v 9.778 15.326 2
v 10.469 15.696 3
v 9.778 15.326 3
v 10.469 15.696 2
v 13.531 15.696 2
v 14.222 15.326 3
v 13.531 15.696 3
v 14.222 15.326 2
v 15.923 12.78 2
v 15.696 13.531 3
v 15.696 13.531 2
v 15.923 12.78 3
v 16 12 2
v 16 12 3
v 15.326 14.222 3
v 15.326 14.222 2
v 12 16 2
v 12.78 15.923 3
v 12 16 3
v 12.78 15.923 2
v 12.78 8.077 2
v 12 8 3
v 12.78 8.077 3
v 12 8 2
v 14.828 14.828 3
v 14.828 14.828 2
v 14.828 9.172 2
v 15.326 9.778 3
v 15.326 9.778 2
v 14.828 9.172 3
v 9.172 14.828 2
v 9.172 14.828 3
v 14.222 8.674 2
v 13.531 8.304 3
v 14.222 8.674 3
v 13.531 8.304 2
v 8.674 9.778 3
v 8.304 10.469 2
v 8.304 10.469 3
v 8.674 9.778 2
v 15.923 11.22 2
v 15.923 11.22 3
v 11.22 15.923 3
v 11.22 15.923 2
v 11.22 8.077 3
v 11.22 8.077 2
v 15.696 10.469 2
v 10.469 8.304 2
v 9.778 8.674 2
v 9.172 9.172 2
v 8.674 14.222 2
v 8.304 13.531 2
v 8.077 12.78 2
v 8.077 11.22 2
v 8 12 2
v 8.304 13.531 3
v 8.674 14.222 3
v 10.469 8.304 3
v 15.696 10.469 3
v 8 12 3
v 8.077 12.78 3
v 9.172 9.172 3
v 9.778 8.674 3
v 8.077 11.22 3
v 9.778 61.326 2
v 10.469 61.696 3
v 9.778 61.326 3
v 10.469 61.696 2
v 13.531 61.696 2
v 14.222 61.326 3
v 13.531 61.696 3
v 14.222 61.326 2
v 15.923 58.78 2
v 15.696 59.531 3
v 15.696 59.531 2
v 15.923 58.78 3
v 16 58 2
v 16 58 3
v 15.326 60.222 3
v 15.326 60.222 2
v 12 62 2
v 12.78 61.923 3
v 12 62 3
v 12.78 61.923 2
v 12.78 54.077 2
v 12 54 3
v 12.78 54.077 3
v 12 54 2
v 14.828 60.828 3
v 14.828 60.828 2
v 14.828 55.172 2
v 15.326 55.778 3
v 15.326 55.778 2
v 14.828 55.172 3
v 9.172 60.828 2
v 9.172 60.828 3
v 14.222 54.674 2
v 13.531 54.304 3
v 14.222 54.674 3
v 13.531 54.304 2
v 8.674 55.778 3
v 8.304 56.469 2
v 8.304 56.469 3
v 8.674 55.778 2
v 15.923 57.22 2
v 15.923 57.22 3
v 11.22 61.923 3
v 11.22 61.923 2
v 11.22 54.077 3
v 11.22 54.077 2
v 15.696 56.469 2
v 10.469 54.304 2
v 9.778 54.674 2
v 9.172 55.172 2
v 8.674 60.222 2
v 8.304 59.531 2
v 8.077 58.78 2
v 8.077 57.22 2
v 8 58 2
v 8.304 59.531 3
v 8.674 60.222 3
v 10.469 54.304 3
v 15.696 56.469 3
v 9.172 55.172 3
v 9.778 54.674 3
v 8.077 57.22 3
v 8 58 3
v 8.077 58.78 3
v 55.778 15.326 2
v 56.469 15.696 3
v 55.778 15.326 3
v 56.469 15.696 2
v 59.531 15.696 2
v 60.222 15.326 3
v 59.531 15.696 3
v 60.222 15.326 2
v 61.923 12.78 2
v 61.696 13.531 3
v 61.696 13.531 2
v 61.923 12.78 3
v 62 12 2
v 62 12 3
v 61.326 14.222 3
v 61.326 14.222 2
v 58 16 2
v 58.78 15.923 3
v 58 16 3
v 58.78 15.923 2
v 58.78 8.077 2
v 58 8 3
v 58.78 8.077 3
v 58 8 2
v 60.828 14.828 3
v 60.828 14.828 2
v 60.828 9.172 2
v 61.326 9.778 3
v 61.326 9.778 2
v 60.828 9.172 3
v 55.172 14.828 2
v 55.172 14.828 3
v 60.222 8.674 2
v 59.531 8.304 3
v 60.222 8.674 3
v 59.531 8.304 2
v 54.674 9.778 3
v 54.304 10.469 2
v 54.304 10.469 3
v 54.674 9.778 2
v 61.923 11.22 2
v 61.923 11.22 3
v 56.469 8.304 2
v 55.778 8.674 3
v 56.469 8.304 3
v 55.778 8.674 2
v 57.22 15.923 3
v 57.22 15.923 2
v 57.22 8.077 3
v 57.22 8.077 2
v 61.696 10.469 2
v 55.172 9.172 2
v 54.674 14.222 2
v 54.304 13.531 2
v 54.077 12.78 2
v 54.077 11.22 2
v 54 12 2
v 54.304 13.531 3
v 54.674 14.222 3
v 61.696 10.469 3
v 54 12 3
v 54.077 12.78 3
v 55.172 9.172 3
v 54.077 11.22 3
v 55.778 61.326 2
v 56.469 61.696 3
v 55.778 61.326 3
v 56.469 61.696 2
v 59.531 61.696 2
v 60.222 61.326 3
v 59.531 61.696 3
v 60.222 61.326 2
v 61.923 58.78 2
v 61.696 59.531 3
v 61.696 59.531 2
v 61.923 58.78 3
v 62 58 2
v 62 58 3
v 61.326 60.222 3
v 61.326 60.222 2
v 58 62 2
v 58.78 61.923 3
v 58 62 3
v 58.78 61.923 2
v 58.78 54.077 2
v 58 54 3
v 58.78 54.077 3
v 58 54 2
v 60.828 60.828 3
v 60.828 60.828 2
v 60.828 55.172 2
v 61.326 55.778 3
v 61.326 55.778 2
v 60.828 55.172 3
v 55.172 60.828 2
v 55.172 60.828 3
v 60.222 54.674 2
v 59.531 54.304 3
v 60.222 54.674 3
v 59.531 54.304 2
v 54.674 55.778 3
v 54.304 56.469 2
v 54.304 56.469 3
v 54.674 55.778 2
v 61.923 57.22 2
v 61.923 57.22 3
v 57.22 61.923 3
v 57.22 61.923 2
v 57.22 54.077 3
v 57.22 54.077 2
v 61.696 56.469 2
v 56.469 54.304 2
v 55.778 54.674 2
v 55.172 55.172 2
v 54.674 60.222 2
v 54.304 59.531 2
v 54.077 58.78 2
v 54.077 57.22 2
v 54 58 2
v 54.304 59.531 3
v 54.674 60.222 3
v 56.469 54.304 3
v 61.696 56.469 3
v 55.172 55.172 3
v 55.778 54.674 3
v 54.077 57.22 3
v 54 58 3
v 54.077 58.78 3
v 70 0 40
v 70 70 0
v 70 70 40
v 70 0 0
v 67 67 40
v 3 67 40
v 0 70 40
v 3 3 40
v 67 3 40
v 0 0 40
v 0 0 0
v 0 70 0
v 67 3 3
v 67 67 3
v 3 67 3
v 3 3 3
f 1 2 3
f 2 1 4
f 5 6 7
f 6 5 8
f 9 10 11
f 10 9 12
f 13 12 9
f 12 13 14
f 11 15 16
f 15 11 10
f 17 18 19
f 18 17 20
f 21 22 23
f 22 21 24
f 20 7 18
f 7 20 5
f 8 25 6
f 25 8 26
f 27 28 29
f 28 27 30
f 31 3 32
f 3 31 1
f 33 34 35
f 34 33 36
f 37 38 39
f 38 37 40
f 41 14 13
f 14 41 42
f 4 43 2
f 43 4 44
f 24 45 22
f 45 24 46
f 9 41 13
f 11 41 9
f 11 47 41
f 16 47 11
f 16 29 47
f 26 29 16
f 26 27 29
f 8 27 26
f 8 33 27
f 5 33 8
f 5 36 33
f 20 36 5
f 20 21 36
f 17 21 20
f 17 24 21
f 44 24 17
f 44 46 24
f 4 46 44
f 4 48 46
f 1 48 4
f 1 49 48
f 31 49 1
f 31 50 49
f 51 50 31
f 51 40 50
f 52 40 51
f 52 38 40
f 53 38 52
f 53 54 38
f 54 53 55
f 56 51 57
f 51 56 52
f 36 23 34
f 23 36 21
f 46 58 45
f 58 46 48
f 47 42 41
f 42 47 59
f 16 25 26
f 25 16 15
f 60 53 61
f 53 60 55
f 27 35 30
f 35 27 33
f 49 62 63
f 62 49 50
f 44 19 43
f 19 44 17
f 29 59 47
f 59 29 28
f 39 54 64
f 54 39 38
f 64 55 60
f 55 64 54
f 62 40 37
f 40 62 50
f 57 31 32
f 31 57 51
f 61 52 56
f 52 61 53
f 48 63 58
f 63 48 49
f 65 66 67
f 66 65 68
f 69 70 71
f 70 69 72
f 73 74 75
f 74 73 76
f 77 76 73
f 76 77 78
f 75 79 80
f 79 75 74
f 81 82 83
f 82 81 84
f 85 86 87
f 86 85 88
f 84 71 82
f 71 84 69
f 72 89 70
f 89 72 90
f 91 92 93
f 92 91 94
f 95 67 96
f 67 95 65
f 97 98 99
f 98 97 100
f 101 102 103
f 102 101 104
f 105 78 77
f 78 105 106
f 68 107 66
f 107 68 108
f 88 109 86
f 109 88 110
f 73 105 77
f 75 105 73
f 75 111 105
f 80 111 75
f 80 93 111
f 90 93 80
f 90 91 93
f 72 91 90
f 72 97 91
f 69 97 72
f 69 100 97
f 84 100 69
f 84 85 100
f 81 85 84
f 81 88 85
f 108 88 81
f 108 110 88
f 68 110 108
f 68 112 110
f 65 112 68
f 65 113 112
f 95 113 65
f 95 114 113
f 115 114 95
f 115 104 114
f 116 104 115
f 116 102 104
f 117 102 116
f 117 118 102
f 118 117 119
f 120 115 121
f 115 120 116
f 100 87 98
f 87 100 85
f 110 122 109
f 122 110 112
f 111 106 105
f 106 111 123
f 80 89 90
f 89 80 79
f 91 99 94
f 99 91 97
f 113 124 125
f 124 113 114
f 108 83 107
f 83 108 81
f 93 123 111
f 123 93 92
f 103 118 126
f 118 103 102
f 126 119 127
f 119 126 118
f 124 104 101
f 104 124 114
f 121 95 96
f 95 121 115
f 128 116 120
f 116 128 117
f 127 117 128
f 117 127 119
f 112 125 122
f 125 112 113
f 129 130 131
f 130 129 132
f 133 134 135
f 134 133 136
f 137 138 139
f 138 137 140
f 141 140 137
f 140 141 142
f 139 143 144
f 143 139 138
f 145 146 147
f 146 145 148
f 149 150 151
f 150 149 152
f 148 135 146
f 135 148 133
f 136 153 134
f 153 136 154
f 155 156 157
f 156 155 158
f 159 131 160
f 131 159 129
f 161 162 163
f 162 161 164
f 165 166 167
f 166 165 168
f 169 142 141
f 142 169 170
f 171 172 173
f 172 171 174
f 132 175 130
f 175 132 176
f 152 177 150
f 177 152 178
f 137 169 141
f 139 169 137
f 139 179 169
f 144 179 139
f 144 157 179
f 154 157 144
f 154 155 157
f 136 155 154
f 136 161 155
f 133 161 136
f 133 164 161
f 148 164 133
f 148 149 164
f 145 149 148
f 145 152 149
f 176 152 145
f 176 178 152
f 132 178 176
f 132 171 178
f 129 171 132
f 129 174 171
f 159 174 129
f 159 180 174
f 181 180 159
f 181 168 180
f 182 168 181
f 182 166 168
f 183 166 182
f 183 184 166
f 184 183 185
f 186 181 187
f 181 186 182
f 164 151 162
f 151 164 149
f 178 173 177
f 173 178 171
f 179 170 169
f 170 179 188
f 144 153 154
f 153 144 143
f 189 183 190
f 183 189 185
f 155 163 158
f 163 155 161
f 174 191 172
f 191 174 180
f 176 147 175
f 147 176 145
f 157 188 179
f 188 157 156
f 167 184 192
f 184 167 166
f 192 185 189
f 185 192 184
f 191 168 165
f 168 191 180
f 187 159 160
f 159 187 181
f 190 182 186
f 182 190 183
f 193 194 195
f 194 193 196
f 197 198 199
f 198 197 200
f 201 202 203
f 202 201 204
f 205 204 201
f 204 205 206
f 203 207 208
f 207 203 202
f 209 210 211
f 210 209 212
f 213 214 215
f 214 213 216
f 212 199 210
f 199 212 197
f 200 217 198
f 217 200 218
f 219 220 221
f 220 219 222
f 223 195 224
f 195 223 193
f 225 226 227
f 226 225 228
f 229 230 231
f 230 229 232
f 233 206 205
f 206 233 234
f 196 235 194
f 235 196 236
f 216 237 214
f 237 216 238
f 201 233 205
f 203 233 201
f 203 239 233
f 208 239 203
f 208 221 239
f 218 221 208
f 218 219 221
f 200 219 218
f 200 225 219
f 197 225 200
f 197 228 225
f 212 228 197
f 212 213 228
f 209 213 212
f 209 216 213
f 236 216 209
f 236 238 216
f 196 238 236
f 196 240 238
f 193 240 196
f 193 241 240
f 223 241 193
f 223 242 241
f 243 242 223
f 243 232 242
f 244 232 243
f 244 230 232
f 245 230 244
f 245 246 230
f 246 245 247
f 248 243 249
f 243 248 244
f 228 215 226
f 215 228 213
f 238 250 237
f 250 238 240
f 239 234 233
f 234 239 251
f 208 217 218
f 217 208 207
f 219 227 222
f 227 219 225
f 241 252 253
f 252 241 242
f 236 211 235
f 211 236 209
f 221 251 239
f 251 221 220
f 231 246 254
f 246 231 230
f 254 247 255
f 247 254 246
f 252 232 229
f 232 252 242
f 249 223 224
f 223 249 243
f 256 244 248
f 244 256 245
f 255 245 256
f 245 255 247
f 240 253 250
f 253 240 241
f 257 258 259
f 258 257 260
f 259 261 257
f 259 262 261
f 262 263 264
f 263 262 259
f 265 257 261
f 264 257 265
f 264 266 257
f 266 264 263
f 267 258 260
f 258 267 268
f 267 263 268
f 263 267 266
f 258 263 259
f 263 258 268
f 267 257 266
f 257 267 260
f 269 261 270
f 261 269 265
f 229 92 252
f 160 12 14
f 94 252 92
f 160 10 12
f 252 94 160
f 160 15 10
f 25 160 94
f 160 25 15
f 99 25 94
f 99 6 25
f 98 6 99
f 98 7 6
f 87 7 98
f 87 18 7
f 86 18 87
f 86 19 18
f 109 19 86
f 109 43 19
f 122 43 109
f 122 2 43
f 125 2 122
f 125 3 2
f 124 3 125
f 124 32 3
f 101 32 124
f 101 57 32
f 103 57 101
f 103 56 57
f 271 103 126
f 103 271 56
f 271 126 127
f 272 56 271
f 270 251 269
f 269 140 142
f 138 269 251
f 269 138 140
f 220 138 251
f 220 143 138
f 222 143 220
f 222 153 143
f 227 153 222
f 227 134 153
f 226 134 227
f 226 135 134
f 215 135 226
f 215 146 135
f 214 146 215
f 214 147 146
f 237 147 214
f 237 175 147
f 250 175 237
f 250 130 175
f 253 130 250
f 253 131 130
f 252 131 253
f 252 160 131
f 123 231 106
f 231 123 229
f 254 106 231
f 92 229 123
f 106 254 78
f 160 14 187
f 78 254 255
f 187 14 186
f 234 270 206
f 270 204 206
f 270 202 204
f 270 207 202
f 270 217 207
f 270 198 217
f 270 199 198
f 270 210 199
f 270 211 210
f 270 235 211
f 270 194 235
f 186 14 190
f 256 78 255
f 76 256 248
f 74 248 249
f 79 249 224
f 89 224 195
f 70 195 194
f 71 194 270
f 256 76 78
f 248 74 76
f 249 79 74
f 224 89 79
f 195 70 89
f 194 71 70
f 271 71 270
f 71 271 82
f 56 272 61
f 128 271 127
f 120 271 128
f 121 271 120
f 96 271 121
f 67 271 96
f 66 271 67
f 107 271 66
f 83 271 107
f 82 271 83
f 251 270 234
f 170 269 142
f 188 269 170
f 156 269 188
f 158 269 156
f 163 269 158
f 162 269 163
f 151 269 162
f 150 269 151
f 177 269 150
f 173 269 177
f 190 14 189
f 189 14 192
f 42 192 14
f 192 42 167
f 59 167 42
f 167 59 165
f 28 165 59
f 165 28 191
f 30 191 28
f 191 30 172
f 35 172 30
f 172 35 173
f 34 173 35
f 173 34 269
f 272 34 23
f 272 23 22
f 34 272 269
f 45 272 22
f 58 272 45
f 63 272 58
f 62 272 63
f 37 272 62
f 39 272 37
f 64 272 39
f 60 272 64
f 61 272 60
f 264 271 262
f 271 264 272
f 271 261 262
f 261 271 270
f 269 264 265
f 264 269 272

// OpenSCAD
$fn = 32;

// ----------------------------------------------------------------------
// Enclosure box: bosses enclosure
// ----------------------------------------------------------------------

// --- parameters (mm) ---
box_l = 70;               // outer length, X
box_w = 70;               // outer width, Y
box_h = 40;               // outer height
wall_t = 3;               // wall thickness
boss_r = 4;               // corner boss radius
hole_r = 1.5;             // boss screw hole radius
boss_in = 12;             // boss inset from the corners

inner_h = box_h - wall_t;  // cavity depth
boss_h = inner_h - 2;  // corner boss height

difference() {
  cube([box_l, box_w, box_h]);
  translate([wall_t, wall_t, wall_t])
    cube([box_l - 2 * wall_t, box_w - 2 * wall_t, box_h]);
  for (sx = [0, 1], sy = [0, 1])
    translate([sx ? box_l - boss_in : boss_in,
               sy ? box_w - boss_in : boss_in, wall_t - 1]) {
      cylinder(r = boss_r, h = boss_h);
      translate([0, 0, boss_h - 4])
        cylinder(r = hole_r, h = 5);
    }
}
